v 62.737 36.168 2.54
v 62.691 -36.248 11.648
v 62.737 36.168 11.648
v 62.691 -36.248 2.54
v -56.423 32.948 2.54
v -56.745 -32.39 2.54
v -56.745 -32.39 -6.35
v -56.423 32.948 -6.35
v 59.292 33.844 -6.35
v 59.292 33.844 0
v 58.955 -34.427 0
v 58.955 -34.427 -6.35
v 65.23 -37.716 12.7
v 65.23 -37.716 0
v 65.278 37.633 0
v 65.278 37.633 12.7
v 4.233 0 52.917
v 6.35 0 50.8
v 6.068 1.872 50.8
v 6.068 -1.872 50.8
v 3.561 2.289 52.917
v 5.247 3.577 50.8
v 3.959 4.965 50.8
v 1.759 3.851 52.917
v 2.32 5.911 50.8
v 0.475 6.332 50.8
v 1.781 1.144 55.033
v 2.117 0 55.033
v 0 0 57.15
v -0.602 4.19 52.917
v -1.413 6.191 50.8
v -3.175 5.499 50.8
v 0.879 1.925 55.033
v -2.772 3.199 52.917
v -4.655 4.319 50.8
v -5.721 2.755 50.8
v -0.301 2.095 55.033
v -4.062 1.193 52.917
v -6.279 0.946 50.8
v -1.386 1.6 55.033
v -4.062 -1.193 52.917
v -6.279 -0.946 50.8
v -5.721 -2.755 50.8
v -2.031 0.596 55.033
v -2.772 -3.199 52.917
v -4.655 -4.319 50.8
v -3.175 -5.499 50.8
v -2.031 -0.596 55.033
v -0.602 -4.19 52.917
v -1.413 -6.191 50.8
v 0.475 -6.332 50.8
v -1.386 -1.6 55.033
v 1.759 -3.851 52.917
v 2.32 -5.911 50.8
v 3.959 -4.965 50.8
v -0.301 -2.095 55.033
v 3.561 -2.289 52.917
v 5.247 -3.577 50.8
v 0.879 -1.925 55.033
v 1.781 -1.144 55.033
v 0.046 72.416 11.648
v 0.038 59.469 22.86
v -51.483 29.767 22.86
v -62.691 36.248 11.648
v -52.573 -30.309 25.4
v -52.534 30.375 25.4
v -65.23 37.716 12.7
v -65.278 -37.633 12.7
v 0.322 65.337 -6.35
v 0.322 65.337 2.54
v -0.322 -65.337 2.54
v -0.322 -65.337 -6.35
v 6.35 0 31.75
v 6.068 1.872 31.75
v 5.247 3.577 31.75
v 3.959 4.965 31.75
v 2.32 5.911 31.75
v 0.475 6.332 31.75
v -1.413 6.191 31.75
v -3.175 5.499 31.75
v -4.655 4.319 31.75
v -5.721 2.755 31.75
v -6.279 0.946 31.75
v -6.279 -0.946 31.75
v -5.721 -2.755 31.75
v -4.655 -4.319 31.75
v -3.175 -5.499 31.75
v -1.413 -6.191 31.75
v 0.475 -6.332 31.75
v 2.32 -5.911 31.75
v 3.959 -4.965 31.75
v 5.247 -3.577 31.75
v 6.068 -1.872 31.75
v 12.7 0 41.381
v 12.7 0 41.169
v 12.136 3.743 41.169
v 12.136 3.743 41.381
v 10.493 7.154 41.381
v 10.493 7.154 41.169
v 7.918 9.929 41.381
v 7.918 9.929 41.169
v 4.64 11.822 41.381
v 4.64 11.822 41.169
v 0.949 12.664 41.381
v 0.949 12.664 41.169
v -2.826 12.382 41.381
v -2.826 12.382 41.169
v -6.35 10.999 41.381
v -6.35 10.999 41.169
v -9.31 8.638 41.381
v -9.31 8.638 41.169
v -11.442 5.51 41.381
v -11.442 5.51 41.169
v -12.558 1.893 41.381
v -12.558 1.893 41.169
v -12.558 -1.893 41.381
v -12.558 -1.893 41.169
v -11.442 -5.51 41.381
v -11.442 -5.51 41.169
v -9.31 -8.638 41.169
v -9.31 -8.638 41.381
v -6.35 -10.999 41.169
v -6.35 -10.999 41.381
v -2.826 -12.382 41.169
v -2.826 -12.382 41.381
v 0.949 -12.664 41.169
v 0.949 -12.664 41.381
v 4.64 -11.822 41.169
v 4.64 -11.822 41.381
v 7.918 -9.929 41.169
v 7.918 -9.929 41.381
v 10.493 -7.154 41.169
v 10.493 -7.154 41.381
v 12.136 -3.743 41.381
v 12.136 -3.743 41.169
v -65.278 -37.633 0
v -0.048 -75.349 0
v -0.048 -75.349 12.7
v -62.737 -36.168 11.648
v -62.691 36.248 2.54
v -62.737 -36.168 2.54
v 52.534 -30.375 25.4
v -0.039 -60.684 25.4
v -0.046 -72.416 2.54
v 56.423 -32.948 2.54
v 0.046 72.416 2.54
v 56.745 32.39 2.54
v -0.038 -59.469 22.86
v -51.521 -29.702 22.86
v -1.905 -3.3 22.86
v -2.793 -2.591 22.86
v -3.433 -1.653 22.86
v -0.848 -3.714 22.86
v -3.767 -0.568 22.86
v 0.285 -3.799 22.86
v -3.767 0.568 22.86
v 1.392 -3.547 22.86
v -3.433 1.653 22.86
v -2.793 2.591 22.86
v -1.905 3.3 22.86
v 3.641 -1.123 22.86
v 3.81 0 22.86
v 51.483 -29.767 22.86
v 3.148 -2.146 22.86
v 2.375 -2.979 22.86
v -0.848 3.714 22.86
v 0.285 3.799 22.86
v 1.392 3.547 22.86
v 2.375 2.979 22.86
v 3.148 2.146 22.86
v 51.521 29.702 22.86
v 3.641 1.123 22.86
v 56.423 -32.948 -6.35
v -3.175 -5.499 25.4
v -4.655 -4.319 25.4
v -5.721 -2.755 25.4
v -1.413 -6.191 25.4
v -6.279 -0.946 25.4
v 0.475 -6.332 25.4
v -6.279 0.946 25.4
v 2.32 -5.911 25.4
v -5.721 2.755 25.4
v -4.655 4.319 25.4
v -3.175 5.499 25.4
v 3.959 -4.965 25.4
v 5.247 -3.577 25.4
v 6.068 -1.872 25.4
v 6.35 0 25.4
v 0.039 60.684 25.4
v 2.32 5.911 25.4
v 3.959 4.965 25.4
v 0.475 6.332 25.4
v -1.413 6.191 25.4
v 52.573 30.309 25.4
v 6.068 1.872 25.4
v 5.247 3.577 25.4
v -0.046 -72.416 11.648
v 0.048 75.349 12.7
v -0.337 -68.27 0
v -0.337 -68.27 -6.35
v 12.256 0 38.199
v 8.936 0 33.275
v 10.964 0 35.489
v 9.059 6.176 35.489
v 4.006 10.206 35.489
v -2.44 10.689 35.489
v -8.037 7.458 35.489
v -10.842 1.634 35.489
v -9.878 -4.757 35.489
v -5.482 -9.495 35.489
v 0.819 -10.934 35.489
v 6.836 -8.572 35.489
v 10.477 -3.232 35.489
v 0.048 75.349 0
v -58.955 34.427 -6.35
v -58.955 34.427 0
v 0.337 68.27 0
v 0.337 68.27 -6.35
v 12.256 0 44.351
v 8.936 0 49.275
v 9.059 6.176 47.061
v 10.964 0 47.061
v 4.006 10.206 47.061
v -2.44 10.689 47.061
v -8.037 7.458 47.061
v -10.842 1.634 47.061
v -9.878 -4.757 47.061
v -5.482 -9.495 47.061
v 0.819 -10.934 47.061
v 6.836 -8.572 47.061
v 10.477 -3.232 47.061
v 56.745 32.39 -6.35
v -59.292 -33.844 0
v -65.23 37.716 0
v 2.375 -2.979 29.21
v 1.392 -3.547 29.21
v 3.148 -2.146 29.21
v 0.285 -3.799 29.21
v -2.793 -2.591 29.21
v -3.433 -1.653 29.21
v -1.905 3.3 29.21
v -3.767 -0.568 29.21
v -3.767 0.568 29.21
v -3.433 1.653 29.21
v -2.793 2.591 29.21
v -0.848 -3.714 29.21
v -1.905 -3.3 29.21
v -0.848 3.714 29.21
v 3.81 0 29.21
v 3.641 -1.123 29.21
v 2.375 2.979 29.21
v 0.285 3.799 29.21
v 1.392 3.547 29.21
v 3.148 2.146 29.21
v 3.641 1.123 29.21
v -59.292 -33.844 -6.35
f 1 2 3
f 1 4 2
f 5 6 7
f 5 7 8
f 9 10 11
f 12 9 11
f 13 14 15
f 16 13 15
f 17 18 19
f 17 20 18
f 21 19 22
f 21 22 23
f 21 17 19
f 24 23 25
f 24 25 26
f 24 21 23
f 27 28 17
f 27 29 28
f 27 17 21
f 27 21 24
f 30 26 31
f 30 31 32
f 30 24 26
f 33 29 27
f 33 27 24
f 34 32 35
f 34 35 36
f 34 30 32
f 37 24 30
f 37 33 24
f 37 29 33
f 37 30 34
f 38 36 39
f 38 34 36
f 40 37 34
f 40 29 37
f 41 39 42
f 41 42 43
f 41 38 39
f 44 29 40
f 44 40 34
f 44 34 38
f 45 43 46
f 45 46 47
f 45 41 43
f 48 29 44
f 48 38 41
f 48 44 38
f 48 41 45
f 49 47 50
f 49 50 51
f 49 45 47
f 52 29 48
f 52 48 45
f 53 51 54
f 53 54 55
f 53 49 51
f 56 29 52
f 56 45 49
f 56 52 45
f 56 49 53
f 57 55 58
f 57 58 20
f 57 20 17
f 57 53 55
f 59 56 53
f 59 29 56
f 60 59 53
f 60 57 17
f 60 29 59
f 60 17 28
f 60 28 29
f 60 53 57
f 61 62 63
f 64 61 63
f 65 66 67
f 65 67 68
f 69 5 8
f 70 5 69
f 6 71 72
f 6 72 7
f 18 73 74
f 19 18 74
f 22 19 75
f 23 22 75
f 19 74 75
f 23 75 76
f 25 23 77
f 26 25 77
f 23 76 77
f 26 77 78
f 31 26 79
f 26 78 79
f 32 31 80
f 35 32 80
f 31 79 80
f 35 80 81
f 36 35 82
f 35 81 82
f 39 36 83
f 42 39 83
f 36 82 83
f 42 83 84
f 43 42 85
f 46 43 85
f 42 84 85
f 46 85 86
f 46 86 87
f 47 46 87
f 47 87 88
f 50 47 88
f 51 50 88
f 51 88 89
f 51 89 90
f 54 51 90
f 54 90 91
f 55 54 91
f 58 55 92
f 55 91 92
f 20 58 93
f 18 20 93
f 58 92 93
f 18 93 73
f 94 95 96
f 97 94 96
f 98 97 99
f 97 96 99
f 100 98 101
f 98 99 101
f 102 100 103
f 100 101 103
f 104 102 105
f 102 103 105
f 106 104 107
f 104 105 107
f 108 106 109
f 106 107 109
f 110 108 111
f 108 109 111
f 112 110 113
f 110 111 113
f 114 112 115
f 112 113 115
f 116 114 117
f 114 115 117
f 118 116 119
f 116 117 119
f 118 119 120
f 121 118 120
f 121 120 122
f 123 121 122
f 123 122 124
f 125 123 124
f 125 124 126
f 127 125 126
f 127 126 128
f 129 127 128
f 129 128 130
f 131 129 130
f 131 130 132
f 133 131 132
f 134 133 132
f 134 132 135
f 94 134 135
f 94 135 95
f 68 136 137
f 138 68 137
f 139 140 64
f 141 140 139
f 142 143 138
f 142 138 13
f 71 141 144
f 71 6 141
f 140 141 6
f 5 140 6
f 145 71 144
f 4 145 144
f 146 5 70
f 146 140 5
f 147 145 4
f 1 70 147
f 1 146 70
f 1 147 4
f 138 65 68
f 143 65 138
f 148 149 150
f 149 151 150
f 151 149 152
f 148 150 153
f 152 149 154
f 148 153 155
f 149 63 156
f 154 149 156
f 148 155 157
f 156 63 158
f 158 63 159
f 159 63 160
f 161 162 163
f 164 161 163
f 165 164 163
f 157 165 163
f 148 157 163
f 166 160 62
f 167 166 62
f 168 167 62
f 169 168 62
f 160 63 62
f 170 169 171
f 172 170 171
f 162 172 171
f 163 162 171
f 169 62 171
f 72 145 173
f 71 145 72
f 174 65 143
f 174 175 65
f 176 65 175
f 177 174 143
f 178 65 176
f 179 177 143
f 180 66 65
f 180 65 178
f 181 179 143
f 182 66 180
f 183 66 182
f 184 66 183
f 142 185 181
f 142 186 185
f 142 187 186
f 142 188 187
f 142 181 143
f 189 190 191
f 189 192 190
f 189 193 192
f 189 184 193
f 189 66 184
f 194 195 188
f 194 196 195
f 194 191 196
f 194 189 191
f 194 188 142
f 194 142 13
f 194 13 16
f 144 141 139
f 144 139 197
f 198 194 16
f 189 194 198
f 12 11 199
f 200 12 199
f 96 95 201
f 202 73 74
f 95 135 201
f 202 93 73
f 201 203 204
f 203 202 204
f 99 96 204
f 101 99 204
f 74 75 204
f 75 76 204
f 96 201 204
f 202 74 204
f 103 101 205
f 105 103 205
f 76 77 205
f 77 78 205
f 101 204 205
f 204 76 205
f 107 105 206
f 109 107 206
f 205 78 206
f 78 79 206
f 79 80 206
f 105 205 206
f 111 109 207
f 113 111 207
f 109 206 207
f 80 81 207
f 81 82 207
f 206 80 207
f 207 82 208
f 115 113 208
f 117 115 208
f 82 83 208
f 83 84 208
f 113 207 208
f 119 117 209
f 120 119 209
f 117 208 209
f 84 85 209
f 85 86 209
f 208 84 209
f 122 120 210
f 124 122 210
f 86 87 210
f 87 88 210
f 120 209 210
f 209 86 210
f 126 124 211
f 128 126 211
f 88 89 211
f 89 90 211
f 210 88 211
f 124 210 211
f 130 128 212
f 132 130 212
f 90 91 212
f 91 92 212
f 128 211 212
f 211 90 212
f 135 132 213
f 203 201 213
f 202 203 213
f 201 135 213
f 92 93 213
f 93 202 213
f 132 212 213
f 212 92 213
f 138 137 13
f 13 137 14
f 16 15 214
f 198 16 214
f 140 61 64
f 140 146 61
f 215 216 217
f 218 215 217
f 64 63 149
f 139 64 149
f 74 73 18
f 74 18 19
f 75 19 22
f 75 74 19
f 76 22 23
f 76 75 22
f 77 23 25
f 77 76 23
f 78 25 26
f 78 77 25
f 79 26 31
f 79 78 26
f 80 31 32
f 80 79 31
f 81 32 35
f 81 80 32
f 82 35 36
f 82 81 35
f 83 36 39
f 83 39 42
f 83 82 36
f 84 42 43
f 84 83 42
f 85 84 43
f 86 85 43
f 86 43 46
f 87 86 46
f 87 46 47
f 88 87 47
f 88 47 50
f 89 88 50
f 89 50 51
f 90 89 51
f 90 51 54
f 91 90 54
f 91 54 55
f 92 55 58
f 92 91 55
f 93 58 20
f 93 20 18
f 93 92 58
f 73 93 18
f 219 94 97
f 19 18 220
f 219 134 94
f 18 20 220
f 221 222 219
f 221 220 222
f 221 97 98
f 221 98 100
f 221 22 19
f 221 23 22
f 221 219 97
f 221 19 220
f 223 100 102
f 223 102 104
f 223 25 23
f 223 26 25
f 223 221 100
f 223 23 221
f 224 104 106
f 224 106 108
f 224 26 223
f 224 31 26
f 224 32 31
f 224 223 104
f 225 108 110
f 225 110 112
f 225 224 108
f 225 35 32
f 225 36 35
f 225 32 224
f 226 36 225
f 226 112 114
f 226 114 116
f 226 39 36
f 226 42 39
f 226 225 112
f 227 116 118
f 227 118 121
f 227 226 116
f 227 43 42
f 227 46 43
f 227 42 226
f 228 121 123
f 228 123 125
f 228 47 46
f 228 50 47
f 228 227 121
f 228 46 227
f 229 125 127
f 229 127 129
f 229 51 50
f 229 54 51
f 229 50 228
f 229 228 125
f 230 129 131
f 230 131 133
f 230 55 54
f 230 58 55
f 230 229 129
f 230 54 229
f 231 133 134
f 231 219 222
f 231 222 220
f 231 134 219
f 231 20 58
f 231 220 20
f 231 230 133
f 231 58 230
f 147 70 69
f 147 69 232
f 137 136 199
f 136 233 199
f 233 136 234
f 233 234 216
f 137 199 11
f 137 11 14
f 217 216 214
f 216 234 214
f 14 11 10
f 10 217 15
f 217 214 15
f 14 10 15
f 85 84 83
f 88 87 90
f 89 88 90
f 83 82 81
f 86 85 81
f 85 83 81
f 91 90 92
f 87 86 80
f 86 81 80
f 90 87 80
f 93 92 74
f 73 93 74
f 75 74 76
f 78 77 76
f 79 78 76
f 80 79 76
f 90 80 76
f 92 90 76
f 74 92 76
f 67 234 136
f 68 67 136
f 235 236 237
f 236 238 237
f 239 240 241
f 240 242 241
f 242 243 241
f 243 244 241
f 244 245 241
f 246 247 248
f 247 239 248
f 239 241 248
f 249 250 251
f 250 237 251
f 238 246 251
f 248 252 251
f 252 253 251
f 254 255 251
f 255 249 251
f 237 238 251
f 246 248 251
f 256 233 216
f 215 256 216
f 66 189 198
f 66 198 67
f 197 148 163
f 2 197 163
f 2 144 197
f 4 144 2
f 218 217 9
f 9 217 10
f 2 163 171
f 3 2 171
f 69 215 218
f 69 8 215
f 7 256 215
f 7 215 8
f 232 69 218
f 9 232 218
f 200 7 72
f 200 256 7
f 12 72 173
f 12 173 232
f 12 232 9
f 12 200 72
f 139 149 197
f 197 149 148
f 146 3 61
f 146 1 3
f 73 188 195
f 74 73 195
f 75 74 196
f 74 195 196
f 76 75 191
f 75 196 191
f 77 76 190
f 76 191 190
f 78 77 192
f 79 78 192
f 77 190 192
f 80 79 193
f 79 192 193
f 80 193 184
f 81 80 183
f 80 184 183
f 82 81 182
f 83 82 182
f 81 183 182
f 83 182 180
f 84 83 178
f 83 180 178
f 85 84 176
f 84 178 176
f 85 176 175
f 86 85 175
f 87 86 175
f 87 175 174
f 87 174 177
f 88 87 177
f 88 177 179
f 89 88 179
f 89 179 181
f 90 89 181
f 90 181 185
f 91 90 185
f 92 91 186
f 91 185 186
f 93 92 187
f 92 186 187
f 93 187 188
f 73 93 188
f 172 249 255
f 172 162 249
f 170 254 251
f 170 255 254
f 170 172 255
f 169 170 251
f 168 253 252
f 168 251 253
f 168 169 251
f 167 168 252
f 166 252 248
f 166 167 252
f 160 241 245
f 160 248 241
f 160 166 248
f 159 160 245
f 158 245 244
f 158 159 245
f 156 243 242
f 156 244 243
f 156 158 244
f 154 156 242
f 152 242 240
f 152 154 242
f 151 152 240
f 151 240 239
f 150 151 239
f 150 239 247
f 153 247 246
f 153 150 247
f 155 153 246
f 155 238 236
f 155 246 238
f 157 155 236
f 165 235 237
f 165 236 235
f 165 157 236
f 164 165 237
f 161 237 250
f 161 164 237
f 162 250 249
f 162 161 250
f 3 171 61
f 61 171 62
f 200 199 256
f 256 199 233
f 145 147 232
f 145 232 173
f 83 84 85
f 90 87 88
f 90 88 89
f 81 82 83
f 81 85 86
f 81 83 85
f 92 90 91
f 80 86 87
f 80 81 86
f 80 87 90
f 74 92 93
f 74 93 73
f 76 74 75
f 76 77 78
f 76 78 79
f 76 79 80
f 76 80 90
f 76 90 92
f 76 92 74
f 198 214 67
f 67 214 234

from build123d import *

# Parameters (mm, degrees)
F1_DEPTH  = 25.4
F2_SIZE   = 12.7
F3_R      = 6.35
F4_DEPTH  = 6.35
F5_R      = 12.7
F5_R_2    = 6.35
F6_DEPTH  = 19.05
F8_DEPTH  = 25.4
F9_SIZE   = 6.35
F11_DEPTH = 6.35
F12_T     = -2.54


# Not quite as in the source:
# - a fillet or chamfer that OpenCascade refuses, or shapes differently, is made with other operations: its cross-section is extruded or revolved along the edge and cut away or added


with BuildPart() as f1:
    # F0 (on Top) → F1 (new body)
    with BuildSketch(Plane.XY):
        Polygon((-0.0479153058, -75.3485536492), (65.2298039457, -37.7157726967), (65.2777192516, 37.6327809526), (0.0479153058, 75.3485536492), (-65.2298039457, 37.7157726967), (-65.2777192516, -37.6327809526), align=None)
    extrude(amount=F1_DEPTH)

    # F2
    f2_edges = [f1.edges().sort_by_distance(p)[0] for p in [
        (-32.662817, -56.490667, 25.4),
        (32.590944, -56.532163, 25.4),
        (65.253762, -0.041496, 25.4),
        (32.662817, 56.490667, 25.4),
        (-32.590944, 56.532163, 25.4),
        (-65.253762, 0.041496, 25.4),
    ]]
    chamfer(f2_edges, length=F2_SIZE)

    # F3 (on face) → F4 (join)
    with BuildSketch(Plane.XY.offset(25.4)):
        Circle(F3_R)
    extrude(amount=F4_DEPTH)


with BuildPart() as f6:
    # F5 (on face) → F6 (new body)
    with BuildSketch(Plane.XY.offset(31.75)):
        Circle(F5_R)
        Circle(F5_R_2, mode=Mode.SUBTRACT)
    extrude(amount=F6_DEPTH)

    # F7: fillet of radius 10.16 on 2 edges, made by hand

    # F7_s1 → F7_t2 (revolve, cut)
    with BuildSketch(Plane.XZ):
        with BuildLine():
            ThreePointArc((12.7, 41.3814279214), (10.9642269675, 47.0610405842), (6.35, 50.8))
            Line((6.35, 50.8), (12.7, 50.8))
            Line((12.7, 50.8), (12.7, 41.3814279214))
        make_face()
    revolve(axis=Axis((0, 0, 50.8), (0, 0, 1)), mode=Mode.SUBTRACT)

    # F7_s3 → F7_t4 (revolve, cut)
    with BuildSketch(Plane.XZ):
        with BuildLine():
            ThreePointArc((12.7, 41.1685720786), (10.9642269675, 35.4889594158), (6.35, 31.75))
            Line((6.35, 31.75), (12.7, 31.75))
            Line((12.7, 31.75), (12.7, 41.1685720786))
        make_face()
    revolve(axis=Axis((0, 0, 31.75), (0, 0, 1)), mode=Mode.SUBTRACT)


with BuildPart() as f8:
    # F8 (new): a face of the model
    f8_faces = [f1.part.faces().sort_by_distance(p)[0] for p in [
        (0, 0, 31.75),
    ]]
    extrude(f8_faces, amount=F8_DEPTH)

    # F9
    f9_edges = [f8.edges().sort_by_distance(p)[0] for p in [
        (-6.35, 0, 57.15),
    ]]
    chamfer(f9_edges, length=F9_SIZE)


with BuildPart() as f1_1:
    add(f1.part)

    # F10 (on face) → F11 (join)
    with BuildSketch(Plane(origin=(0, 0, 0), x_dir=(1, 0, 0), z_dir=(0, 0, -1))):
        Polygon((58.9554861724, 34.4266958261), (-0.3366500675, 68.2702966308), (-59.29213624, 33.8436008047), (-58.9554861724, -34.4266958261), (0.3366500675, -68.2702966308), (59.29213624, -33.8436008047), align=None)
    extrude(amount=F11_DEPTH)

    # F12
    f12_openings = [f1_1.faces().sort_by_distance(p)[0] for p in [
        (0, 0, -6.35),
    ]]
    offset(amount=F12_T, openings=f12_openings, kind=Kind.INTERSECTION)


solid = Compound([f6.part, f8.part, f1_1.part])
